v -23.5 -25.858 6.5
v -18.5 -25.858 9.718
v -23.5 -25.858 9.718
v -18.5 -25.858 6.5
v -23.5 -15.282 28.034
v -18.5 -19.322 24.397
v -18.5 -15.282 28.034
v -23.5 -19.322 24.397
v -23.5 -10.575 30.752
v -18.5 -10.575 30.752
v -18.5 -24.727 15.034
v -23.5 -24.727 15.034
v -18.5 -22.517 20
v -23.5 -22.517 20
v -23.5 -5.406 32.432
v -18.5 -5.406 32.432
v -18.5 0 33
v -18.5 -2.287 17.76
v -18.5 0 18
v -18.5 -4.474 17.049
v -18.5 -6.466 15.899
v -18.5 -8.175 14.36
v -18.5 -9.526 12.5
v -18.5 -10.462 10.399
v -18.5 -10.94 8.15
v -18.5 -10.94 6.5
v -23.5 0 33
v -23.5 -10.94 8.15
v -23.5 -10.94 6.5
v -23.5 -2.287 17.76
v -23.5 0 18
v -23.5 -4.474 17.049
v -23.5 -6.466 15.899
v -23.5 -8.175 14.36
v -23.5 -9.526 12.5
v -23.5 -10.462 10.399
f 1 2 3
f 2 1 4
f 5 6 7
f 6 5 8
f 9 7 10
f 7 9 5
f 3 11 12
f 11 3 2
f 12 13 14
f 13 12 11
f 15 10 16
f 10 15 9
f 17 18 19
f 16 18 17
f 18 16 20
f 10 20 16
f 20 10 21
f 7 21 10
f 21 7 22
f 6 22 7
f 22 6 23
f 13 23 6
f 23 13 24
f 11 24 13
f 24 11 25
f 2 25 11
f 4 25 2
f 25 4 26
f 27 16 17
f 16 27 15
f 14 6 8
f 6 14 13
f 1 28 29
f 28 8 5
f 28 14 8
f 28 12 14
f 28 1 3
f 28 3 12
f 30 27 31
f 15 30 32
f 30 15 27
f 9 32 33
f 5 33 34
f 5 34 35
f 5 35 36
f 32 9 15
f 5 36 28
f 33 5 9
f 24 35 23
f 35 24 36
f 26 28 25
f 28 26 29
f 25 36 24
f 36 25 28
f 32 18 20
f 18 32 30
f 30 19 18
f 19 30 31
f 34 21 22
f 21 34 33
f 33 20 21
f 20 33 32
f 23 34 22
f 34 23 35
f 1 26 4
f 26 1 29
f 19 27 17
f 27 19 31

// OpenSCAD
module outer_ring(){
    difference() {

        translate([-21,0,7]) {
            //cube([110, 26, 27], true);
            rotate([0,90,0]) {
                cylinder(5, 26, 26, true);
            }
        }
        
        translate([-20,0,7]) {
            
            rotate([0,90,0]) {
                cylinder(10, 11, 11, true);
            }
        }
        
        translate([-20,-20,-7]) {
            cube([110, 126, 27], true);
        }
        
        translate([20,20,19]) {
            cube([110, 40, 30], true);
        }
        
    }
}

outer_ring();
